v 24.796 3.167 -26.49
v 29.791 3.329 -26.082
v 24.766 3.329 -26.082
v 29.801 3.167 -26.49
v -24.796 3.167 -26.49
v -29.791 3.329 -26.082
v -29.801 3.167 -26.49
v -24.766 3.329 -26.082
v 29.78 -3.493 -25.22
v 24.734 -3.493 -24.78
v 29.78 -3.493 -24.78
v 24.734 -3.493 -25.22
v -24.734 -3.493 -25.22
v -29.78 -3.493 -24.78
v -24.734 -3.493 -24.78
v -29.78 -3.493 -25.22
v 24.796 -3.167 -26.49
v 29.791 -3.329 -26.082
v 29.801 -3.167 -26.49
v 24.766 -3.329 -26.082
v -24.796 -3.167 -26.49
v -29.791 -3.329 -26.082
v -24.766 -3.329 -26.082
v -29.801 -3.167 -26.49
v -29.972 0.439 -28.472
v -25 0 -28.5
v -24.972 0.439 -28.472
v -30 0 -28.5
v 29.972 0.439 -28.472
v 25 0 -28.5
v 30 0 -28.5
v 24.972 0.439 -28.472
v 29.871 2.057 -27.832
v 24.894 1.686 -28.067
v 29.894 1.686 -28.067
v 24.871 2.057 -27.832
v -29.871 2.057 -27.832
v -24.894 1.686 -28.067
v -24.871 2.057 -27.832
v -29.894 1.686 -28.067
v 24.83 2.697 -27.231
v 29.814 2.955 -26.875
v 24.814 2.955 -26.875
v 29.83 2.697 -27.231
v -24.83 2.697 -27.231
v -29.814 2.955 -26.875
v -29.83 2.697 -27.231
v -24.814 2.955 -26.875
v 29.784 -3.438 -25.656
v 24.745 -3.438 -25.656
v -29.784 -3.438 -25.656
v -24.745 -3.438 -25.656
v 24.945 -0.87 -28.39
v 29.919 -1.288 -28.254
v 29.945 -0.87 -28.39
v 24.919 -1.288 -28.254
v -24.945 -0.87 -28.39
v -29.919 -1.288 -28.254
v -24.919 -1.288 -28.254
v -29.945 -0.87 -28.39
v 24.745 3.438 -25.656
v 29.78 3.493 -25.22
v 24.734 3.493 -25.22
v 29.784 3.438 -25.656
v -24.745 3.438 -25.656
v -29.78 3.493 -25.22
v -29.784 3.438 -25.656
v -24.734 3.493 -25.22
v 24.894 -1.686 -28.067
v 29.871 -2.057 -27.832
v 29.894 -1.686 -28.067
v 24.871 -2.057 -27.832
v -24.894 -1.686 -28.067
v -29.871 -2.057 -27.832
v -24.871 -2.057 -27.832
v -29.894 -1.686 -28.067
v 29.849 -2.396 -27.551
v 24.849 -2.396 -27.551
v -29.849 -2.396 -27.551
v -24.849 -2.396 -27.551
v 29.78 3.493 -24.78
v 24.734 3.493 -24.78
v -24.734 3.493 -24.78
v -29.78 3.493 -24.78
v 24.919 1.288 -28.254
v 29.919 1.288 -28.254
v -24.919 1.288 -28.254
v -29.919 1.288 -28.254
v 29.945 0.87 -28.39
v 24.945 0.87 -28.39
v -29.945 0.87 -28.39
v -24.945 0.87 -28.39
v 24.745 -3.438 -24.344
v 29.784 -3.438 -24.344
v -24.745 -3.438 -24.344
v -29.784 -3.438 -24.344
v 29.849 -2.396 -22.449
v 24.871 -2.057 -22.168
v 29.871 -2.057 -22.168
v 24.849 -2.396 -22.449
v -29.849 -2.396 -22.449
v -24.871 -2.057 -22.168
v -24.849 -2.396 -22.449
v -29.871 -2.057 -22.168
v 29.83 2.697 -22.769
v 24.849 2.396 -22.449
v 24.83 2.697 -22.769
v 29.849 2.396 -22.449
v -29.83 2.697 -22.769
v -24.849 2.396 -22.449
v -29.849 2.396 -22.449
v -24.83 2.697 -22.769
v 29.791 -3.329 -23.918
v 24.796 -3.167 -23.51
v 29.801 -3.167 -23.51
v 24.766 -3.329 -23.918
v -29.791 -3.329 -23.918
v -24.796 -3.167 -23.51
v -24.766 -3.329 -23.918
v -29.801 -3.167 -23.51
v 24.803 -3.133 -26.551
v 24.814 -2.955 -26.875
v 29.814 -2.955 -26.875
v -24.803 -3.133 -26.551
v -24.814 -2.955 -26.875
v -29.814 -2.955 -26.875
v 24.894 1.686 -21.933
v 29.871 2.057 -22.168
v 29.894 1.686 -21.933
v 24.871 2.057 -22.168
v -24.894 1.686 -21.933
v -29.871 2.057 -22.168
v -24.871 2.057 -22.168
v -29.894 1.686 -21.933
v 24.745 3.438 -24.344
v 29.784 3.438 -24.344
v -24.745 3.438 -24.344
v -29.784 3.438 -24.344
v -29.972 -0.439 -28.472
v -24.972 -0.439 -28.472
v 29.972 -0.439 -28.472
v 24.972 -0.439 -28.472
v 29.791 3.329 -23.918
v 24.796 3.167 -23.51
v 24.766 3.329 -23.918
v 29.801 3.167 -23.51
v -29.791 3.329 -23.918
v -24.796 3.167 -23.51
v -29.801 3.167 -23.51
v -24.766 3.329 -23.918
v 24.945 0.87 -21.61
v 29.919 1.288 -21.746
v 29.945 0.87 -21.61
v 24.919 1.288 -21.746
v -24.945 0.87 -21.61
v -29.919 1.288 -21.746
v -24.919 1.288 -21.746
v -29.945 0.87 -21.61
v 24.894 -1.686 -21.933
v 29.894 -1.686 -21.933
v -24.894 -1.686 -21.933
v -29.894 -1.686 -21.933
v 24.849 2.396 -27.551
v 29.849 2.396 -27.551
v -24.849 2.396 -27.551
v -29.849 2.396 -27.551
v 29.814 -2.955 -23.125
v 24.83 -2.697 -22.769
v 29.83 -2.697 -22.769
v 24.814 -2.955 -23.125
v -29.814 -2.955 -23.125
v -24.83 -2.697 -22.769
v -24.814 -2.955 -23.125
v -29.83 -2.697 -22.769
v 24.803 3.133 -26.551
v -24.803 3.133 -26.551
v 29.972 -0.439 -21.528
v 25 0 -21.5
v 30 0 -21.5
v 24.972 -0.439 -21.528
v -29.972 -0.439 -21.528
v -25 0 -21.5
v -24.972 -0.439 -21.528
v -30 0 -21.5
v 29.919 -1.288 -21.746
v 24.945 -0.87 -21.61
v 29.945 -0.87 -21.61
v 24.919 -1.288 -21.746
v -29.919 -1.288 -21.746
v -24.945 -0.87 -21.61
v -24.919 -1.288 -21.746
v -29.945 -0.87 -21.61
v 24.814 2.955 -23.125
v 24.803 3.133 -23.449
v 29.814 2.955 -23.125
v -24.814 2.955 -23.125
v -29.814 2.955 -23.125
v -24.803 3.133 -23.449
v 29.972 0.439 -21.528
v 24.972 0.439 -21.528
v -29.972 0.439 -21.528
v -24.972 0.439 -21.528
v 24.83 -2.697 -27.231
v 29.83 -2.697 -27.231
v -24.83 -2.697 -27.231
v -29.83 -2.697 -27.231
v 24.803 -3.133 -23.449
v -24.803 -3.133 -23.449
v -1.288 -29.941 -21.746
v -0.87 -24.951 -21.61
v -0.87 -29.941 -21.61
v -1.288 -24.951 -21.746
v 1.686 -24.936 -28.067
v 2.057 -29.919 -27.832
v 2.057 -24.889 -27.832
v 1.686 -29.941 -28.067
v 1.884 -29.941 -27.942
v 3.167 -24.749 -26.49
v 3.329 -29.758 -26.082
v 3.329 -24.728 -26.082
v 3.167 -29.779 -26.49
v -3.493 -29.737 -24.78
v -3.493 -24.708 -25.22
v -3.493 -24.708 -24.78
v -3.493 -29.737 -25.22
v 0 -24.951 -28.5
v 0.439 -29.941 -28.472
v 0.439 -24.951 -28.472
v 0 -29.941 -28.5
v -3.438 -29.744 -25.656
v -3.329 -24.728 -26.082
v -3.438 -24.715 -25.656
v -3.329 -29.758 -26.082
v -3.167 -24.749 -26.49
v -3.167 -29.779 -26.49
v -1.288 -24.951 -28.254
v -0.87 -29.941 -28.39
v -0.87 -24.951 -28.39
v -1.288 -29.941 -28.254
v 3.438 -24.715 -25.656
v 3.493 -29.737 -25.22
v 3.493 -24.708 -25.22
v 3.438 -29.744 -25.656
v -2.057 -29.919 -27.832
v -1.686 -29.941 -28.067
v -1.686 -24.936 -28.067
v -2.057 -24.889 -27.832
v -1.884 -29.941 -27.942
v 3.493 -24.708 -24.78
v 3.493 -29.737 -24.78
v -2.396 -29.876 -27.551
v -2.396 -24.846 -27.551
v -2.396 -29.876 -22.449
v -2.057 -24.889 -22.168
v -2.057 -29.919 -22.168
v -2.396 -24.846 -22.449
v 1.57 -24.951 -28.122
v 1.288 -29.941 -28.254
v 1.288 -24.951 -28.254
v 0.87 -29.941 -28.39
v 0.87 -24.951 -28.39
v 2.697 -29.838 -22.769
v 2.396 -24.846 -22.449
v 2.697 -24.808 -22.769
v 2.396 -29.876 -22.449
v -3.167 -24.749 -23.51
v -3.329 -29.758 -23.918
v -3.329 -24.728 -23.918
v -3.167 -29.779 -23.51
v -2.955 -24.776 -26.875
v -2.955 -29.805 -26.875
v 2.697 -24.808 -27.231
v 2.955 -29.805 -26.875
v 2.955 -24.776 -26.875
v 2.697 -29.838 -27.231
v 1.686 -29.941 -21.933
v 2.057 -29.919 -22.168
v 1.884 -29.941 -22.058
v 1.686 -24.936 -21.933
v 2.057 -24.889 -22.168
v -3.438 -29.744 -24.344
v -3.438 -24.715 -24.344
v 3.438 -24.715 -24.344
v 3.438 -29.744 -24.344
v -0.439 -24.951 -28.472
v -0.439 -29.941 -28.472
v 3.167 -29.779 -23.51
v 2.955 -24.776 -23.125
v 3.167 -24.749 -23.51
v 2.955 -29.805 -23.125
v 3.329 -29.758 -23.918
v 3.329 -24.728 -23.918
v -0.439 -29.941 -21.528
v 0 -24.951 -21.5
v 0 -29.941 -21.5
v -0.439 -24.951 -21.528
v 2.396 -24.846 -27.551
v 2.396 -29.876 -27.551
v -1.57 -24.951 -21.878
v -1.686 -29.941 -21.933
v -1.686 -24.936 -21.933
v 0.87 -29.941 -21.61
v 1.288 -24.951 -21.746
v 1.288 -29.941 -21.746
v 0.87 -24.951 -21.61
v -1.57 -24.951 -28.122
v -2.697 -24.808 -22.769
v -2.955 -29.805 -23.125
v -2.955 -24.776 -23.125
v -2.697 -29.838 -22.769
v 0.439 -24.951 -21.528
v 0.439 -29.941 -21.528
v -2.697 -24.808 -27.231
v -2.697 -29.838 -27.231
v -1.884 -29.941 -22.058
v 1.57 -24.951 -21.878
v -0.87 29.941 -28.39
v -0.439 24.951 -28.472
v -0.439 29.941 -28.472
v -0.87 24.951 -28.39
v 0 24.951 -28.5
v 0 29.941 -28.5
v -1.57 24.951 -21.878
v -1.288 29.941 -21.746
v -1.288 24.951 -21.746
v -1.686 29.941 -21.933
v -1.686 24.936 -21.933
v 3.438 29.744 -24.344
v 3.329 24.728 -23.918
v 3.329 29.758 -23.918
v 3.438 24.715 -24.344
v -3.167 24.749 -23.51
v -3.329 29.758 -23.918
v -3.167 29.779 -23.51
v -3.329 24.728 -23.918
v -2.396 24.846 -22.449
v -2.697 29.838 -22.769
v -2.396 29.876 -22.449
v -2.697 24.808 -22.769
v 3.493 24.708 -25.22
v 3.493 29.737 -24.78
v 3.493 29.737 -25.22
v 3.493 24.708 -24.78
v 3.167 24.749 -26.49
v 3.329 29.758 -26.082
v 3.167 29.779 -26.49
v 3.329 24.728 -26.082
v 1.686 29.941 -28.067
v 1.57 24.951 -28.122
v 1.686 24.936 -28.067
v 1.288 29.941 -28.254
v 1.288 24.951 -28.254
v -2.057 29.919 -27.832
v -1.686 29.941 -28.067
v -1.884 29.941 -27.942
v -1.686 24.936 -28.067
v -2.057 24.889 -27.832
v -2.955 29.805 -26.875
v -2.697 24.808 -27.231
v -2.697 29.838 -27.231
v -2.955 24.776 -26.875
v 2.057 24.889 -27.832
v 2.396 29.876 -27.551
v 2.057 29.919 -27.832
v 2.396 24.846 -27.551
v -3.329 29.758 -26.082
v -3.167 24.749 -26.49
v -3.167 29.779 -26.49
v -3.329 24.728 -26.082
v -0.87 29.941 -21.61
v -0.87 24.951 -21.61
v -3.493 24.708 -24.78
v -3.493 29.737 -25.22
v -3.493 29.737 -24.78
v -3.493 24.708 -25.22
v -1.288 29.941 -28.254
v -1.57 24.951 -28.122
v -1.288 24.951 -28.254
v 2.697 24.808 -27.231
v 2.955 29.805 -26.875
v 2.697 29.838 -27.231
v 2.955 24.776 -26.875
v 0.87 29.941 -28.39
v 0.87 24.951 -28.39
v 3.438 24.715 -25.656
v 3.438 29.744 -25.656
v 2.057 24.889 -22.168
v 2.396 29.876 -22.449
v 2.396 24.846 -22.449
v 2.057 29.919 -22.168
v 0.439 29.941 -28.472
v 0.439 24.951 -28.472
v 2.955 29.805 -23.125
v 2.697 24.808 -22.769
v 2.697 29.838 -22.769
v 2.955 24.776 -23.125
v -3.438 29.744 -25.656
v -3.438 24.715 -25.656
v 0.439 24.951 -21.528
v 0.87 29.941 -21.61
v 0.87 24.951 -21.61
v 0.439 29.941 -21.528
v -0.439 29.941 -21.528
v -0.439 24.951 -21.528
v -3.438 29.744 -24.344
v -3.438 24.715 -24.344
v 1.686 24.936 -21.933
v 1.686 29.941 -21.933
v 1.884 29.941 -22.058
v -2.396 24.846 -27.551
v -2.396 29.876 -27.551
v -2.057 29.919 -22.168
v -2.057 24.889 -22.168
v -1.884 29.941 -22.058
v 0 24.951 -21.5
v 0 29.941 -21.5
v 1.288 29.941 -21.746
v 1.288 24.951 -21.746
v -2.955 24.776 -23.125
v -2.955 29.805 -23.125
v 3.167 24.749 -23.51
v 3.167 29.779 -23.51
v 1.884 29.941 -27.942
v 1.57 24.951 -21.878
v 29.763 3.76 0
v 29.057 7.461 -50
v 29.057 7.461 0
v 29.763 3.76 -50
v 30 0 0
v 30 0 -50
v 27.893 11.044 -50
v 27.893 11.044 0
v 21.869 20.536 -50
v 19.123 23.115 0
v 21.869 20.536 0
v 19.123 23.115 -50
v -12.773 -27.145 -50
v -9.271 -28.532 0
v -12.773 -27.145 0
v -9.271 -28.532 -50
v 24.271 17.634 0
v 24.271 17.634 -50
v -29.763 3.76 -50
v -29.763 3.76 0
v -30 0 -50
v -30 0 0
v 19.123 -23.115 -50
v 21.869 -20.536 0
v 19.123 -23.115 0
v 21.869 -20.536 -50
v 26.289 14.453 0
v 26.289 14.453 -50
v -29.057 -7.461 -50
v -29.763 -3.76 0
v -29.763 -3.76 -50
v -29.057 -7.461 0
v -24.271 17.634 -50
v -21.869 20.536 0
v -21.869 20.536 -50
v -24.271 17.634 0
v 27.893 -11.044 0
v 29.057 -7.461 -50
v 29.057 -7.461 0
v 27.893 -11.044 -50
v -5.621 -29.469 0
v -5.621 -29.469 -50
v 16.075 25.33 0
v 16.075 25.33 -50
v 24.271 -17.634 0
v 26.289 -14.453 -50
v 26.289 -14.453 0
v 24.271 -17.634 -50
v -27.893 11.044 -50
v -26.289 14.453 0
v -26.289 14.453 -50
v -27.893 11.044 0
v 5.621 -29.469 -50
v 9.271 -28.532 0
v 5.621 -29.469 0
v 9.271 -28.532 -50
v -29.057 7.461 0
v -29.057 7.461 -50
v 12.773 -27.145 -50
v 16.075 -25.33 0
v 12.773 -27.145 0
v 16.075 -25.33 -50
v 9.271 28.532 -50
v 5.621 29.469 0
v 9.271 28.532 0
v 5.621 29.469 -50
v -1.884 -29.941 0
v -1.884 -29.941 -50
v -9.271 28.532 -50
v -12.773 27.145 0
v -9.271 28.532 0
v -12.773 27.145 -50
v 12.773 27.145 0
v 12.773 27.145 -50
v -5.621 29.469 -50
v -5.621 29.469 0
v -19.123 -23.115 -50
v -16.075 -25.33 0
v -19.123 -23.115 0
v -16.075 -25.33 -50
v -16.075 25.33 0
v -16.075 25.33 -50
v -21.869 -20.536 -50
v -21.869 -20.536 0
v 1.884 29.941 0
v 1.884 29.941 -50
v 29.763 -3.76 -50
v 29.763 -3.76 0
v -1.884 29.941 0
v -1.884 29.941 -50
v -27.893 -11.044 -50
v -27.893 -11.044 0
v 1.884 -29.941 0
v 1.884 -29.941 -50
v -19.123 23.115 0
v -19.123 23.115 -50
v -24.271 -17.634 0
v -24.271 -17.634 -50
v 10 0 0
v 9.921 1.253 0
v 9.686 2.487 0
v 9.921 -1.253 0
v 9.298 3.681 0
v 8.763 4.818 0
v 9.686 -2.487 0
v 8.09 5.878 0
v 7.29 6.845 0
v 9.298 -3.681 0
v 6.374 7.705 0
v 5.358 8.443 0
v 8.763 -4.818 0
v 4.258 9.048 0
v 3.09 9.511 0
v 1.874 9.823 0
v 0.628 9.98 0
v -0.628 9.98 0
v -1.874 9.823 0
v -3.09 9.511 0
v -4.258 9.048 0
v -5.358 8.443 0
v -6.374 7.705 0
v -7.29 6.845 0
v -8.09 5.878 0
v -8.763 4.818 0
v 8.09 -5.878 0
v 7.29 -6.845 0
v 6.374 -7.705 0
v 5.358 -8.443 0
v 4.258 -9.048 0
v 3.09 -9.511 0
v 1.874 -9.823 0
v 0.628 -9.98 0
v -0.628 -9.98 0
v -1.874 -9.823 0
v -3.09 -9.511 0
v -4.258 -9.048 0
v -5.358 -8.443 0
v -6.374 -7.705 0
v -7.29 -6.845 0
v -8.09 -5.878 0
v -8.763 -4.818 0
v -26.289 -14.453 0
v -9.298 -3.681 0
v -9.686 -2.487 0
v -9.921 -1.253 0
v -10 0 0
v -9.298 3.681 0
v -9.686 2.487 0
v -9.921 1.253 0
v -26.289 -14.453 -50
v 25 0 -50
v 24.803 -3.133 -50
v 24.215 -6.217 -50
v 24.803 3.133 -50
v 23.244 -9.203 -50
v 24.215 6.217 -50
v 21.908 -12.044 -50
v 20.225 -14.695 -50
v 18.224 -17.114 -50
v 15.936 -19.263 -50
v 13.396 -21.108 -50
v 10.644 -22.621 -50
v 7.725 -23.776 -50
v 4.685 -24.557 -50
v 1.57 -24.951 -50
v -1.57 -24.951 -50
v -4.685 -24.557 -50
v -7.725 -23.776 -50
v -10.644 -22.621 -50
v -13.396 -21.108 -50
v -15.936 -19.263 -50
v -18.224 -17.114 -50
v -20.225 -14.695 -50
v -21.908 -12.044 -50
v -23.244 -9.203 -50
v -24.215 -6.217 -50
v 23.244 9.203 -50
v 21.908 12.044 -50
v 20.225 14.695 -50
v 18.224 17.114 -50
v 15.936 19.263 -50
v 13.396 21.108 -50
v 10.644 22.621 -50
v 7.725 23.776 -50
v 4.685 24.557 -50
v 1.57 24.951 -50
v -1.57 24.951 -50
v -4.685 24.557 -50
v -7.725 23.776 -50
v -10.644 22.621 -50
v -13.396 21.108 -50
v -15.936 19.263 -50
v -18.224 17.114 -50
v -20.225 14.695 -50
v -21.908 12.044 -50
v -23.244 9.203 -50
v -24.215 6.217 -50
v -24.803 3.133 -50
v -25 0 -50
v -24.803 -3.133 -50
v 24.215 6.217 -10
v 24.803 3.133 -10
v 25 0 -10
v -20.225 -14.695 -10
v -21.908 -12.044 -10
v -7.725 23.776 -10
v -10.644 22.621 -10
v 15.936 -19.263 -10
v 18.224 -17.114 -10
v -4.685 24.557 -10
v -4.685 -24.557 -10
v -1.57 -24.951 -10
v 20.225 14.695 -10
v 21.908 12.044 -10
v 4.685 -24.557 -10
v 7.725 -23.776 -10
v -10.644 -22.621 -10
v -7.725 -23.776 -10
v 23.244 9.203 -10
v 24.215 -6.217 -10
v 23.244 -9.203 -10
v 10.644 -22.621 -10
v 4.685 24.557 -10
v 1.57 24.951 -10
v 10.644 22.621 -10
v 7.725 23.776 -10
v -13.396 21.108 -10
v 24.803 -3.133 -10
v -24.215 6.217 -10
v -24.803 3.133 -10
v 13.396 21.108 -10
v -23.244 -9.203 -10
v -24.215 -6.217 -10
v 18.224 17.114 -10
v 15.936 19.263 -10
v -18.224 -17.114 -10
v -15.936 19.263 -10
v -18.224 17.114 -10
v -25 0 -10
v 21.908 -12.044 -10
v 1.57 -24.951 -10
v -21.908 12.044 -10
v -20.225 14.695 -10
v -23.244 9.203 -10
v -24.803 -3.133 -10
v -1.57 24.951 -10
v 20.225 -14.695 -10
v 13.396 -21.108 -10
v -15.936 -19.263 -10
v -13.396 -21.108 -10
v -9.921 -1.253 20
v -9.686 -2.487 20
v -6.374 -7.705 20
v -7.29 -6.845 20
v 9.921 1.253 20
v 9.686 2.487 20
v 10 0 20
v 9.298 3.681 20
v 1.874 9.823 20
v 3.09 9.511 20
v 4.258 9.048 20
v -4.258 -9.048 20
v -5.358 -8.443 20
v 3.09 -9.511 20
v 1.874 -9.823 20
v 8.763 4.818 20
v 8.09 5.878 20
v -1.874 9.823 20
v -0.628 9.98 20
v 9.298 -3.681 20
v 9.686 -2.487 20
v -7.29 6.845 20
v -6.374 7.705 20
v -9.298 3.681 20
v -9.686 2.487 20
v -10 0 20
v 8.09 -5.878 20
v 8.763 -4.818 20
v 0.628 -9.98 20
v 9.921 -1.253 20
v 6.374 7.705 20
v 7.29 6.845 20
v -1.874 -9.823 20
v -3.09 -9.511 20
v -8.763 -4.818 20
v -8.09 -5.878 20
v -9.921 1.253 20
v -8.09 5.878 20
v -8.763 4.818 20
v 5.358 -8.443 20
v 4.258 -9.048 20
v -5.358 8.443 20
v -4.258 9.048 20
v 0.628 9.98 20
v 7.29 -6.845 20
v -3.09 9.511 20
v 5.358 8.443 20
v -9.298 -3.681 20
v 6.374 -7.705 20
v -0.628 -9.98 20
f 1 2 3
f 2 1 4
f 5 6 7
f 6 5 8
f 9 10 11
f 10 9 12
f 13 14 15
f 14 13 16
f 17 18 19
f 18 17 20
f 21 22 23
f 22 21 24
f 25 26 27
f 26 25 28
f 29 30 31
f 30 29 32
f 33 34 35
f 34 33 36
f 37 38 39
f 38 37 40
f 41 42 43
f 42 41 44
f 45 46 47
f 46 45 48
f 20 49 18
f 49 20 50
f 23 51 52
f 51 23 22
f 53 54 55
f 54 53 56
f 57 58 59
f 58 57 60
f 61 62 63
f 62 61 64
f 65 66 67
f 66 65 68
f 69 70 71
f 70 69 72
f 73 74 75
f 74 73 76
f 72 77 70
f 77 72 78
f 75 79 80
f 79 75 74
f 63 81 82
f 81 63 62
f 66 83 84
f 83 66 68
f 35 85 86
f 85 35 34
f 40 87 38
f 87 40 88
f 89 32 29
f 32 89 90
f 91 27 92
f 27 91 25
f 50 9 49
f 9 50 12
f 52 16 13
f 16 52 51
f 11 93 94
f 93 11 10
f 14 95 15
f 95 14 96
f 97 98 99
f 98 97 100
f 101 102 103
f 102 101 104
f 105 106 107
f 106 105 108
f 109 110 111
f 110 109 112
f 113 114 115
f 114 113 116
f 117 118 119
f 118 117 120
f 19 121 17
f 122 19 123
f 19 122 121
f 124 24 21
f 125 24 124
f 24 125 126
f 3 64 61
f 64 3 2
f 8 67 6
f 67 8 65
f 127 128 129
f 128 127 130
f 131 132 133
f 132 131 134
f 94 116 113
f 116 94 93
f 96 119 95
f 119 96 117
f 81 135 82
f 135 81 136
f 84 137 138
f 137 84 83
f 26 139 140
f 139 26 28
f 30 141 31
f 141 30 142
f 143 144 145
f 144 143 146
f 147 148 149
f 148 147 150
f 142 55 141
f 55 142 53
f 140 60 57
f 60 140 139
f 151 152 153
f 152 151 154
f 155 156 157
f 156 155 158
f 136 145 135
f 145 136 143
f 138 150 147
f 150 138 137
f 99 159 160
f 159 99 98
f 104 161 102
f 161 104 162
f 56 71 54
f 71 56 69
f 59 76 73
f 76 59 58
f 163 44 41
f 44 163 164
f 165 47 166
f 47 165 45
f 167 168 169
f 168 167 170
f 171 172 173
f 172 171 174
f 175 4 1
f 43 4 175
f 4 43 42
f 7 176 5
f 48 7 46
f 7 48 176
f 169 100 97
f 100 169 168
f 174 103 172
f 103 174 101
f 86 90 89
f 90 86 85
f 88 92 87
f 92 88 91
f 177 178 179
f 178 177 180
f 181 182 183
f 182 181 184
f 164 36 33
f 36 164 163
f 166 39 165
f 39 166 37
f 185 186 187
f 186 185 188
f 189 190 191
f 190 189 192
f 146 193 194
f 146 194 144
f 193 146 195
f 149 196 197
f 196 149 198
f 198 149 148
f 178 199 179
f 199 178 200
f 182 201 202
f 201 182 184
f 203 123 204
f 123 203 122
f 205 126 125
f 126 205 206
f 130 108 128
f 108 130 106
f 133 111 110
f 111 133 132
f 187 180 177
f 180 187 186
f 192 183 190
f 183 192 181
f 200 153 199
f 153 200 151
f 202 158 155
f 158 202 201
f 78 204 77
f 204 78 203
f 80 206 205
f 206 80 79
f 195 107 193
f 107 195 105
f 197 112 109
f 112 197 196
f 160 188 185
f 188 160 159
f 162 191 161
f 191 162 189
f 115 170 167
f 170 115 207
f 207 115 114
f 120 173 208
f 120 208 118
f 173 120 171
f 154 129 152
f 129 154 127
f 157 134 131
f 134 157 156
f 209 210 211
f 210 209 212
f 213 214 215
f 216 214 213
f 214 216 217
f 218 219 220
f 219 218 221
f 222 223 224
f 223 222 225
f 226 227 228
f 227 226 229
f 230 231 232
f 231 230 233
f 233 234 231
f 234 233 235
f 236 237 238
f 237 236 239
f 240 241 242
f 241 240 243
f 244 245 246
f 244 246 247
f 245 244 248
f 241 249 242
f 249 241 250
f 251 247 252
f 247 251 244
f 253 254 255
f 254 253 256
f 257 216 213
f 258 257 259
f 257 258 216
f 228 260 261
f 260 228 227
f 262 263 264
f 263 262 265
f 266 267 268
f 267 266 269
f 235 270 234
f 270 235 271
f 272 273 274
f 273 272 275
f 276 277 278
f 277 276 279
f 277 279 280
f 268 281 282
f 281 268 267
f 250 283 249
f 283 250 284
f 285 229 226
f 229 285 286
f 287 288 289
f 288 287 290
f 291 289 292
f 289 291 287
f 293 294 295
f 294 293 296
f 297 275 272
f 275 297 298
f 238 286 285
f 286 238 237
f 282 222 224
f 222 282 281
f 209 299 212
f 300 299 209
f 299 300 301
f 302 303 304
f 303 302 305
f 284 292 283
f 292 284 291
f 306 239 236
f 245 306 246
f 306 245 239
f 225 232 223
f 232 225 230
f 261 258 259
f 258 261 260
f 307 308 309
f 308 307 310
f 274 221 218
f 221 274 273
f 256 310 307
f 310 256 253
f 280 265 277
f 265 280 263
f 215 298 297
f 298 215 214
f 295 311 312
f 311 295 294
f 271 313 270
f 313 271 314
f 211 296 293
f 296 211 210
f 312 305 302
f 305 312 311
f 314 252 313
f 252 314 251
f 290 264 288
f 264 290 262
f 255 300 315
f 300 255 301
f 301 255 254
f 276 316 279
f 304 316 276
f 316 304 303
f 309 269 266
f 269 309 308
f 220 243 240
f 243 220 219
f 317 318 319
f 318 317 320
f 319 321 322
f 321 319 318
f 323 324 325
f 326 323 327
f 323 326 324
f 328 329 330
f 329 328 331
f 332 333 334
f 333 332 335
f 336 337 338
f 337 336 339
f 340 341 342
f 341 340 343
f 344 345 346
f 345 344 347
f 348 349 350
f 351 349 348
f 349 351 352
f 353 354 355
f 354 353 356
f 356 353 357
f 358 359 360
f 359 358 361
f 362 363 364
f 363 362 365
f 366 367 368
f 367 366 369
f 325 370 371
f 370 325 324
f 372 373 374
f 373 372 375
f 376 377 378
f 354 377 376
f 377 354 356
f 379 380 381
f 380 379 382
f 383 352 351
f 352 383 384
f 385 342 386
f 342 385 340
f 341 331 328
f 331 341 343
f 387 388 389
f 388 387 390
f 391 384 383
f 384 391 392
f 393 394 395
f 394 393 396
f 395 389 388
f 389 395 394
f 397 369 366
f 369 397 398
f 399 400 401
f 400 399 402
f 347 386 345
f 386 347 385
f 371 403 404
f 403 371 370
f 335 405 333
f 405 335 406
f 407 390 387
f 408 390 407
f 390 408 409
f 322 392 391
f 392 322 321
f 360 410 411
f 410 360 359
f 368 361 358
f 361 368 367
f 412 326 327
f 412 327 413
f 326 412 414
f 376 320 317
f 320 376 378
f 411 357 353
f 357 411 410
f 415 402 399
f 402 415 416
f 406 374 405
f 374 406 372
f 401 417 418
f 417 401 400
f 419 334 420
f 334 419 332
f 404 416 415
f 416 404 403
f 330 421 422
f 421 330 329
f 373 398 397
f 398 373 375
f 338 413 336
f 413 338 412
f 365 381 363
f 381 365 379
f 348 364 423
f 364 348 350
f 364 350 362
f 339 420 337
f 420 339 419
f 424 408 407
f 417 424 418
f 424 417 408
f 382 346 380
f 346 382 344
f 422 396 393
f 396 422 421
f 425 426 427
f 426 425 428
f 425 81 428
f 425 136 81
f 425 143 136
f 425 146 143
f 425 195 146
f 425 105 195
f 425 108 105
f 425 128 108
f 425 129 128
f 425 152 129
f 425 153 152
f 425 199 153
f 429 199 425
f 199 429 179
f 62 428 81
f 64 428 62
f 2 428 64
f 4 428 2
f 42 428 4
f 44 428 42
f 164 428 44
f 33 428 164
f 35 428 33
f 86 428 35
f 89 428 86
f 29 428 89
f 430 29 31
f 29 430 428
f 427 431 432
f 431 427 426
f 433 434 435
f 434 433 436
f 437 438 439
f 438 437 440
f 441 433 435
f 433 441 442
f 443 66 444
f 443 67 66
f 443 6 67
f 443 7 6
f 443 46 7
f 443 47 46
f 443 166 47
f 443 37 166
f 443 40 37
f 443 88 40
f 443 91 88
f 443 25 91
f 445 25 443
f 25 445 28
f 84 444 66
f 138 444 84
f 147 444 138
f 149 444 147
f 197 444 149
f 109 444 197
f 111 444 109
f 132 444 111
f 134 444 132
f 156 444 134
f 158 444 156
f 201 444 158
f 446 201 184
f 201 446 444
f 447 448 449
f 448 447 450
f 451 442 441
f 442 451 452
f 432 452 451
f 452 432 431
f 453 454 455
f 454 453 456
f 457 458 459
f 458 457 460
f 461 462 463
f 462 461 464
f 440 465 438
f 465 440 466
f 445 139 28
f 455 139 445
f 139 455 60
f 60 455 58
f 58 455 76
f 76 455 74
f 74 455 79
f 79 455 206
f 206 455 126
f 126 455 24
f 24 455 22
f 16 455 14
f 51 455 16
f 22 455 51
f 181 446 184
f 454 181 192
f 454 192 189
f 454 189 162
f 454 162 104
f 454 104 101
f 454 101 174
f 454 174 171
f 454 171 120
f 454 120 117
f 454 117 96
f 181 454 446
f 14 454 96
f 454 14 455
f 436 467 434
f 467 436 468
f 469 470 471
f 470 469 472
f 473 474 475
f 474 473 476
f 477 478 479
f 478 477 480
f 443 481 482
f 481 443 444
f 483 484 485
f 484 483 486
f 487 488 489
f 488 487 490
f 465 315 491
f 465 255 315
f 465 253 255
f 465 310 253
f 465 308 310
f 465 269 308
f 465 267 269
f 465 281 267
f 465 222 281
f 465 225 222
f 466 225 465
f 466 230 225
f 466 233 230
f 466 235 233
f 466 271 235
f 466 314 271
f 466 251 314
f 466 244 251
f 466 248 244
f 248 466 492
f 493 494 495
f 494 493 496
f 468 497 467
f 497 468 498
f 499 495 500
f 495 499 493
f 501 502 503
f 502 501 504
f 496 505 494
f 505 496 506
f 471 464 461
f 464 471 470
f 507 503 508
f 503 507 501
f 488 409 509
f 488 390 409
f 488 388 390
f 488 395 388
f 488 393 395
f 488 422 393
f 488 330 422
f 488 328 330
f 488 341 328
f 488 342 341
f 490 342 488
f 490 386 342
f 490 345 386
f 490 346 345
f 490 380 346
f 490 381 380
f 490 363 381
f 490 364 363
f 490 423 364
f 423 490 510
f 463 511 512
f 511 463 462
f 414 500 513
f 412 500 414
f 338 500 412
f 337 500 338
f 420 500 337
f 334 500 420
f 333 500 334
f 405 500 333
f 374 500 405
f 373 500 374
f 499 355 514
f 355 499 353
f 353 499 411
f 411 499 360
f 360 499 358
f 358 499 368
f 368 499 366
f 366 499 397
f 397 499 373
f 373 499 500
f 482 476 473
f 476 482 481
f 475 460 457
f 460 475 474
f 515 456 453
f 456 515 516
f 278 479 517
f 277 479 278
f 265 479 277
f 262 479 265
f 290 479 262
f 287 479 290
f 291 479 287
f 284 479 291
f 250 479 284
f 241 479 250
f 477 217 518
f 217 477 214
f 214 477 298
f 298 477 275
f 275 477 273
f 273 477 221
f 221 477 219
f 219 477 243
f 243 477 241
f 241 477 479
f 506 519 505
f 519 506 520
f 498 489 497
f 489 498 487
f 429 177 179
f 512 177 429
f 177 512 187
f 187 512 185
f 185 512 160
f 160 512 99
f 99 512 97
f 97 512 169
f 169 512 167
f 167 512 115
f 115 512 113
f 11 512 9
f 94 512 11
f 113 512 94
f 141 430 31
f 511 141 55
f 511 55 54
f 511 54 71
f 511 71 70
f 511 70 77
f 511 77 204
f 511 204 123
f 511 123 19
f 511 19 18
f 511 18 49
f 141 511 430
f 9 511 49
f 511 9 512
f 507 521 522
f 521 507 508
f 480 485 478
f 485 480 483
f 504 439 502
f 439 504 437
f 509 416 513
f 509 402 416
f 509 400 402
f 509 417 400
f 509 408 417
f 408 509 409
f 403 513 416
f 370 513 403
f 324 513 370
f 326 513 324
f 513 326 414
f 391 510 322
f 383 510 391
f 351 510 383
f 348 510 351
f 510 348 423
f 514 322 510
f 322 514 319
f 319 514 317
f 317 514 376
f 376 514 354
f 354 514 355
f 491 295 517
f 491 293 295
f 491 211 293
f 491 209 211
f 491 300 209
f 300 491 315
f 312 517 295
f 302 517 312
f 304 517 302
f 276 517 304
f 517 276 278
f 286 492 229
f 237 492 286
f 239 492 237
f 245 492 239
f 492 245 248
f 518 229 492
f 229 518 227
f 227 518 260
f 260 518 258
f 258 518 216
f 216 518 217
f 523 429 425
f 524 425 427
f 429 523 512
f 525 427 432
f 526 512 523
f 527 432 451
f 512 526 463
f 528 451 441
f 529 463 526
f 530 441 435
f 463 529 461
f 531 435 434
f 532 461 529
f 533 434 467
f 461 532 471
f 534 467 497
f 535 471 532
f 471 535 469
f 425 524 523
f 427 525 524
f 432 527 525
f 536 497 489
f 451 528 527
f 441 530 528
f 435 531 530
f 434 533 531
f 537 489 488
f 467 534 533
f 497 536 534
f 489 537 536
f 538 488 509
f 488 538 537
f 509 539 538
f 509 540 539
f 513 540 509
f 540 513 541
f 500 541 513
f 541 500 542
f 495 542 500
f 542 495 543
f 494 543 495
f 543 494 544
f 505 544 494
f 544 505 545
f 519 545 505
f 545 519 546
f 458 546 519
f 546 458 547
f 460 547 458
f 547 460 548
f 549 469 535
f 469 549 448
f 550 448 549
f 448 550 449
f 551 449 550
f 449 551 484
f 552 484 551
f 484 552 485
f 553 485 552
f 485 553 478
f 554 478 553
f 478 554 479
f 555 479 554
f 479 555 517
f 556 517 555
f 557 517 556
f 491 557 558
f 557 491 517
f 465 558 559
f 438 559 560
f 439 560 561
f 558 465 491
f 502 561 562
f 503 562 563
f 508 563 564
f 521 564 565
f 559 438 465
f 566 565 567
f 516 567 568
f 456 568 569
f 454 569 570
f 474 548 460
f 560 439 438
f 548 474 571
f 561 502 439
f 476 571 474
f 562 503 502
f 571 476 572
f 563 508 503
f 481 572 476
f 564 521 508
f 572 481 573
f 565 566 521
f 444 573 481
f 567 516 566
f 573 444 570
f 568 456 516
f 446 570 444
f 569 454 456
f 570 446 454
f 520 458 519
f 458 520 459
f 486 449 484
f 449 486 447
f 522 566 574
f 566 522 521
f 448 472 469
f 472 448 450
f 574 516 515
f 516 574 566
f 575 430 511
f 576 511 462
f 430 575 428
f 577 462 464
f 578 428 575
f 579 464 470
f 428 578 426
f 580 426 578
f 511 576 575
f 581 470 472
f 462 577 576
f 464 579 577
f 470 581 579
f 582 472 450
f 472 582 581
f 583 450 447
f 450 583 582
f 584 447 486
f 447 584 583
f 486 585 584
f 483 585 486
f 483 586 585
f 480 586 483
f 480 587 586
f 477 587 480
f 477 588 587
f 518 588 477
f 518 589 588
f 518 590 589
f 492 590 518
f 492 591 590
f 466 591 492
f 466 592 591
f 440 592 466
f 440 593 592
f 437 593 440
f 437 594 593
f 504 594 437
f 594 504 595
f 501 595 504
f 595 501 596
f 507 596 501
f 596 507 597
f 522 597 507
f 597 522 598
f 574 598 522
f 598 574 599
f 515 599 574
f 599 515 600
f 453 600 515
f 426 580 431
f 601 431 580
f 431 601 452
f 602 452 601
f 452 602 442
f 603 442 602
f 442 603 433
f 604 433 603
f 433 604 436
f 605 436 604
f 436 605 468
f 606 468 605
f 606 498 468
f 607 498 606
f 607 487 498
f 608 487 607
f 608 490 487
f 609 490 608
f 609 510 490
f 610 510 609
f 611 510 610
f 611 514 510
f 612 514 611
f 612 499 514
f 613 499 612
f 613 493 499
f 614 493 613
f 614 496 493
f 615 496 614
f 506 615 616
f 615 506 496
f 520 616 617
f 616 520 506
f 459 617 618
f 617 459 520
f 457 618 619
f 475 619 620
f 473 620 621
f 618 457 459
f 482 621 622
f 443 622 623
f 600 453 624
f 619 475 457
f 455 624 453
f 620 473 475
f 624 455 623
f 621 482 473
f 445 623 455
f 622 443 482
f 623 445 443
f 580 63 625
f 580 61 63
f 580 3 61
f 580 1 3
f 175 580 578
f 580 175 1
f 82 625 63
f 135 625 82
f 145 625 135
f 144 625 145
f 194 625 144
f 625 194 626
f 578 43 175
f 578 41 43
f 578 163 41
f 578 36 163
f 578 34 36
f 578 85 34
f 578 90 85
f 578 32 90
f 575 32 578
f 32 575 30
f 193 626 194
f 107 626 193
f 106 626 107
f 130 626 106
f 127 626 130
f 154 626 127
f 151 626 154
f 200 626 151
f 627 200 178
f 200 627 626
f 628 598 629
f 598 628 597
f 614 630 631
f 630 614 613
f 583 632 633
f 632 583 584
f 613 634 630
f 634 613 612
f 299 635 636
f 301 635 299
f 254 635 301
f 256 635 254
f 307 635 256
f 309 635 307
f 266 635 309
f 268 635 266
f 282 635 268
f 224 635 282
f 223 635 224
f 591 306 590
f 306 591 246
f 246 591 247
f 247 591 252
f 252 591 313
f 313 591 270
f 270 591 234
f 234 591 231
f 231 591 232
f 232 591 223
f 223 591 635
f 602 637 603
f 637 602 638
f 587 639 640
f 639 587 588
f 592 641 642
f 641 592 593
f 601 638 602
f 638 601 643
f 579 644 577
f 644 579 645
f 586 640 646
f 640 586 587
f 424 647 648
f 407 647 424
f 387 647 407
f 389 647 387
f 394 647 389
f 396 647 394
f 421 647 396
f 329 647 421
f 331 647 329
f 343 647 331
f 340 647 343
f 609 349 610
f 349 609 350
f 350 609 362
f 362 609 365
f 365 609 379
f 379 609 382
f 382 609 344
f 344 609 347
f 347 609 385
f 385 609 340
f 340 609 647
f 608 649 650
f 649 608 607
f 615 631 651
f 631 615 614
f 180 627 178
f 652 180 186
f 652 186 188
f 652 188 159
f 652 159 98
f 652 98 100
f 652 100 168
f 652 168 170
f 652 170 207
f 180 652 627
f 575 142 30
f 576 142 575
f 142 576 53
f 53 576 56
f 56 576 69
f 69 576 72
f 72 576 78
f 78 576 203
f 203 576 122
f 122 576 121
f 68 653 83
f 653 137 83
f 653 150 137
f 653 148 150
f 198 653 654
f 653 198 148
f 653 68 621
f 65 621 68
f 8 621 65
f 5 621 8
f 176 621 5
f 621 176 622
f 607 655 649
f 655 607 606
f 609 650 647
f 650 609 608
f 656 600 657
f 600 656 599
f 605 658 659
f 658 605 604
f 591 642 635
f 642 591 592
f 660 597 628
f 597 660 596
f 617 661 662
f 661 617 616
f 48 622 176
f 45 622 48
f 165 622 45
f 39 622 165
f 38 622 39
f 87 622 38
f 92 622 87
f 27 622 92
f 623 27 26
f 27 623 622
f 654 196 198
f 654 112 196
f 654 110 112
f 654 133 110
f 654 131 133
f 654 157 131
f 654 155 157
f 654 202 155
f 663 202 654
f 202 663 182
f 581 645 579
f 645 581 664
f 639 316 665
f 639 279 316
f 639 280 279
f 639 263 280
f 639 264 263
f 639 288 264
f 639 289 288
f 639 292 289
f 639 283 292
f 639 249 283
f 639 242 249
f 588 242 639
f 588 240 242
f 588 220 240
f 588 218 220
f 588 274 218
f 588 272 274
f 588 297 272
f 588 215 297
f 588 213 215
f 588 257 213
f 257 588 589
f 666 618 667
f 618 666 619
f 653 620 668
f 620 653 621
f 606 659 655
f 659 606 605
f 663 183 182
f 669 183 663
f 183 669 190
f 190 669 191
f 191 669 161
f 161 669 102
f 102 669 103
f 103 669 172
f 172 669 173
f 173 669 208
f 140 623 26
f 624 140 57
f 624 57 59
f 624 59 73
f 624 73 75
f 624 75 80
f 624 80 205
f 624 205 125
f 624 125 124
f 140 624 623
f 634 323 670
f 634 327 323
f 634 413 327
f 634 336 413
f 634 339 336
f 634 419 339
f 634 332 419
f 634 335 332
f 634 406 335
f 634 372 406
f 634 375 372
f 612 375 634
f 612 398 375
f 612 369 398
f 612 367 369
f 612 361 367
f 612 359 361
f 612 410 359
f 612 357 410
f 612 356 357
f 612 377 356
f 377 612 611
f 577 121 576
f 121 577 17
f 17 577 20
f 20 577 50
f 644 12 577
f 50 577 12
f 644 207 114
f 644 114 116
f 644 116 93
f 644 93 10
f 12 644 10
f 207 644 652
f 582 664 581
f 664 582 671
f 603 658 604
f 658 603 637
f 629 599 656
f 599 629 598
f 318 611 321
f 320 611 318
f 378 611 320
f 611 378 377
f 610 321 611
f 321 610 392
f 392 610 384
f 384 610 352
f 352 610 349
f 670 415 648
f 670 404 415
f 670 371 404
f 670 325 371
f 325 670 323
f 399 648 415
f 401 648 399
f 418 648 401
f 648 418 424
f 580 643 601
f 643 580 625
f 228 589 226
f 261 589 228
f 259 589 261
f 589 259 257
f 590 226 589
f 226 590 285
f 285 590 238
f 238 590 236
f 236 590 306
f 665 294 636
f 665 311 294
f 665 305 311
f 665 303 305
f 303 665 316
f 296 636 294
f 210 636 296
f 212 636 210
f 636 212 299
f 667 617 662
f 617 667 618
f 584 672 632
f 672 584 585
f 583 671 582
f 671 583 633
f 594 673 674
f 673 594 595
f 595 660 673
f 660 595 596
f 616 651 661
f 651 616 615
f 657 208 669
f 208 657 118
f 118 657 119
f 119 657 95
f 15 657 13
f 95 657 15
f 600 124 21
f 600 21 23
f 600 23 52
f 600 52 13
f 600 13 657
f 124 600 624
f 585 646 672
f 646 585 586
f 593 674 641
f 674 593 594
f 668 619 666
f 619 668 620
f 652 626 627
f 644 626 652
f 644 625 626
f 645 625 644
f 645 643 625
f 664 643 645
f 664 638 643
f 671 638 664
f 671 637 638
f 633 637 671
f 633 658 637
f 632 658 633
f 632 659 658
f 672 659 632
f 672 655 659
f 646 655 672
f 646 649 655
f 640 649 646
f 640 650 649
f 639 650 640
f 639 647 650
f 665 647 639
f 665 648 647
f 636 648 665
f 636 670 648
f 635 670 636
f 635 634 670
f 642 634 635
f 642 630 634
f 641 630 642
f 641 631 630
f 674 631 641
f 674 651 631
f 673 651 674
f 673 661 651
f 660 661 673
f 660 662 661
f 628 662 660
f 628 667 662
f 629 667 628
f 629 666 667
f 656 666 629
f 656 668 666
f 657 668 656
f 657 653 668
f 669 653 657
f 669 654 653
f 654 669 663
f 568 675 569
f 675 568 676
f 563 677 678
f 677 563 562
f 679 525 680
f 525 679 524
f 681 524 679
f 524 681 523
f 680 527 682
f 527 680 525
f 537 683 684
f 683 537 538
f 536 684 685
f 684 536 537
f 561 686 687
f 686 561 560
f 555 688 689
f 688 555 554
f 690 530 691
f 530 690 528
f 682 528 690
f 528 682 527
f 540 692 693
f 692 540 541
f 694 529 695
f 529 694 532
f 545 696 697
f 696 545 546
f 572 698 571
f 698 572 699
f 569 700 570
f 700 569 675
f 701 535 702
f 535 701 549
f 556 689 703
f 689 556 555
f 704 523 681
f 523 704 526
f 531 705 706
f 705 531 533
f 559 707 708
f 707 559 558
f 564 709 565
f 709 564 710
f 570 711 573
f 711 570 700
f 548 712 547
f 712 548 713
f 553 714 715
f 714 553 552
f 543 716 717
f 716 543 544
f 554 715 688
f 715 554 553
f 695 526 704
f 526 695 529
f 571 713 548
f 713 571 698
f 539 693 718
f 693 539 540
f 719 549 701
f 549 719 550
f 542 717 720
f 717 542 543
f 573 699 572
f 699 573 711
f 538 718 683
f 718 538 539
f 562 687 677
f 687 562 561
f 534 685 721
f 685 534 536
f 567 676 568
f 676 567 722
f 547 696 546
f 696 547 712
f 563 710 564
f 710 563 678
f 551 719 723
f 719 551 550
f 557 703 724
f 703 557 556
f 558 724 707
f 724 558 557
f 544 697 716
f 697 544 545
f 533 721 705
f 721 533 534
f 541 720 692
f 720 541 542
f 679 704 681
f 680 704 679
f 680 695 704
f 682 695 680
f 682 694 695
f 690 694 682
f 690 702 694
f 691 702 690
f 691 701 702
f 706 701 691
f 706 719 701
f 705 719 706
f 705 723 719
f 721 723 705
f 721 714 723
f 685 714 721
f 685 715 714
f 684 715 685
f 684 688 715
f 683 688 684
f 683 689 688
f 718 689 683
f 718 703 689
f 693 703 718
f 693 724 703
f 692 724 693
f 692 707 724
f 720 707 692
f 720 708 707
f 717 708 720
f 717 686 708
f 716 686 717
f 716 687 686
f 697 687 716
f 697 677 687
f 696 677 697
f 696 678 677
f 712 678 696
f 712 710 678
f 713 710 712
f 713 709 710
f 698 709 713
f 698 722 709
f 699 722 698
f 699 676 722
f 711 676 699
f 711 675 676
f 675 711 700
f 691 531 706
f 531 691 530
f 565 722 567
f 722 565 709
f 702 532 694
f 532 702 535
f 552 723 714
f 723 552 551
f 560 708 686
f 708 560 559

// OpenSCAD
/*NON self centering chuck Feb 2016 Glyn Cowles */
// diameter of grip
hd=20;
// grip height
ht=20; 
//outside diameter of chuck
cdo=60;
// inside diameter of chuck
cdi=50;
// chuck height
ch=50; 
// diam of screw holes
hold=7; 
// number of screw holes
nsh=4; 

$fn=50;
assemble();



//-------------------------------------------------
module assemble() {
    grip();     
    translate([0,0,-ch]) chuck();     
}
 
//-------------------------------------------------
module grip() { 
     cylinder(d=hd,h=ht);
}
//-------------------------------------------------
module chuck() {
    n=cdo-cdi;
    difference() {
     cylinder(d=cdo,h=ch);
     cylinder(d=cdi,h=ch-n);
     #translate([0,0,cdi/2]) holes();
    }    
}
//-------------------------------------------------
module holes() {
    p=360/nsh;
    for (i=[0:nsh-1]) {
        rotate([i*p,90,0]) cylinder(h=cdo/2,d=hold);   
    }
}
//-------------------------------------------------
